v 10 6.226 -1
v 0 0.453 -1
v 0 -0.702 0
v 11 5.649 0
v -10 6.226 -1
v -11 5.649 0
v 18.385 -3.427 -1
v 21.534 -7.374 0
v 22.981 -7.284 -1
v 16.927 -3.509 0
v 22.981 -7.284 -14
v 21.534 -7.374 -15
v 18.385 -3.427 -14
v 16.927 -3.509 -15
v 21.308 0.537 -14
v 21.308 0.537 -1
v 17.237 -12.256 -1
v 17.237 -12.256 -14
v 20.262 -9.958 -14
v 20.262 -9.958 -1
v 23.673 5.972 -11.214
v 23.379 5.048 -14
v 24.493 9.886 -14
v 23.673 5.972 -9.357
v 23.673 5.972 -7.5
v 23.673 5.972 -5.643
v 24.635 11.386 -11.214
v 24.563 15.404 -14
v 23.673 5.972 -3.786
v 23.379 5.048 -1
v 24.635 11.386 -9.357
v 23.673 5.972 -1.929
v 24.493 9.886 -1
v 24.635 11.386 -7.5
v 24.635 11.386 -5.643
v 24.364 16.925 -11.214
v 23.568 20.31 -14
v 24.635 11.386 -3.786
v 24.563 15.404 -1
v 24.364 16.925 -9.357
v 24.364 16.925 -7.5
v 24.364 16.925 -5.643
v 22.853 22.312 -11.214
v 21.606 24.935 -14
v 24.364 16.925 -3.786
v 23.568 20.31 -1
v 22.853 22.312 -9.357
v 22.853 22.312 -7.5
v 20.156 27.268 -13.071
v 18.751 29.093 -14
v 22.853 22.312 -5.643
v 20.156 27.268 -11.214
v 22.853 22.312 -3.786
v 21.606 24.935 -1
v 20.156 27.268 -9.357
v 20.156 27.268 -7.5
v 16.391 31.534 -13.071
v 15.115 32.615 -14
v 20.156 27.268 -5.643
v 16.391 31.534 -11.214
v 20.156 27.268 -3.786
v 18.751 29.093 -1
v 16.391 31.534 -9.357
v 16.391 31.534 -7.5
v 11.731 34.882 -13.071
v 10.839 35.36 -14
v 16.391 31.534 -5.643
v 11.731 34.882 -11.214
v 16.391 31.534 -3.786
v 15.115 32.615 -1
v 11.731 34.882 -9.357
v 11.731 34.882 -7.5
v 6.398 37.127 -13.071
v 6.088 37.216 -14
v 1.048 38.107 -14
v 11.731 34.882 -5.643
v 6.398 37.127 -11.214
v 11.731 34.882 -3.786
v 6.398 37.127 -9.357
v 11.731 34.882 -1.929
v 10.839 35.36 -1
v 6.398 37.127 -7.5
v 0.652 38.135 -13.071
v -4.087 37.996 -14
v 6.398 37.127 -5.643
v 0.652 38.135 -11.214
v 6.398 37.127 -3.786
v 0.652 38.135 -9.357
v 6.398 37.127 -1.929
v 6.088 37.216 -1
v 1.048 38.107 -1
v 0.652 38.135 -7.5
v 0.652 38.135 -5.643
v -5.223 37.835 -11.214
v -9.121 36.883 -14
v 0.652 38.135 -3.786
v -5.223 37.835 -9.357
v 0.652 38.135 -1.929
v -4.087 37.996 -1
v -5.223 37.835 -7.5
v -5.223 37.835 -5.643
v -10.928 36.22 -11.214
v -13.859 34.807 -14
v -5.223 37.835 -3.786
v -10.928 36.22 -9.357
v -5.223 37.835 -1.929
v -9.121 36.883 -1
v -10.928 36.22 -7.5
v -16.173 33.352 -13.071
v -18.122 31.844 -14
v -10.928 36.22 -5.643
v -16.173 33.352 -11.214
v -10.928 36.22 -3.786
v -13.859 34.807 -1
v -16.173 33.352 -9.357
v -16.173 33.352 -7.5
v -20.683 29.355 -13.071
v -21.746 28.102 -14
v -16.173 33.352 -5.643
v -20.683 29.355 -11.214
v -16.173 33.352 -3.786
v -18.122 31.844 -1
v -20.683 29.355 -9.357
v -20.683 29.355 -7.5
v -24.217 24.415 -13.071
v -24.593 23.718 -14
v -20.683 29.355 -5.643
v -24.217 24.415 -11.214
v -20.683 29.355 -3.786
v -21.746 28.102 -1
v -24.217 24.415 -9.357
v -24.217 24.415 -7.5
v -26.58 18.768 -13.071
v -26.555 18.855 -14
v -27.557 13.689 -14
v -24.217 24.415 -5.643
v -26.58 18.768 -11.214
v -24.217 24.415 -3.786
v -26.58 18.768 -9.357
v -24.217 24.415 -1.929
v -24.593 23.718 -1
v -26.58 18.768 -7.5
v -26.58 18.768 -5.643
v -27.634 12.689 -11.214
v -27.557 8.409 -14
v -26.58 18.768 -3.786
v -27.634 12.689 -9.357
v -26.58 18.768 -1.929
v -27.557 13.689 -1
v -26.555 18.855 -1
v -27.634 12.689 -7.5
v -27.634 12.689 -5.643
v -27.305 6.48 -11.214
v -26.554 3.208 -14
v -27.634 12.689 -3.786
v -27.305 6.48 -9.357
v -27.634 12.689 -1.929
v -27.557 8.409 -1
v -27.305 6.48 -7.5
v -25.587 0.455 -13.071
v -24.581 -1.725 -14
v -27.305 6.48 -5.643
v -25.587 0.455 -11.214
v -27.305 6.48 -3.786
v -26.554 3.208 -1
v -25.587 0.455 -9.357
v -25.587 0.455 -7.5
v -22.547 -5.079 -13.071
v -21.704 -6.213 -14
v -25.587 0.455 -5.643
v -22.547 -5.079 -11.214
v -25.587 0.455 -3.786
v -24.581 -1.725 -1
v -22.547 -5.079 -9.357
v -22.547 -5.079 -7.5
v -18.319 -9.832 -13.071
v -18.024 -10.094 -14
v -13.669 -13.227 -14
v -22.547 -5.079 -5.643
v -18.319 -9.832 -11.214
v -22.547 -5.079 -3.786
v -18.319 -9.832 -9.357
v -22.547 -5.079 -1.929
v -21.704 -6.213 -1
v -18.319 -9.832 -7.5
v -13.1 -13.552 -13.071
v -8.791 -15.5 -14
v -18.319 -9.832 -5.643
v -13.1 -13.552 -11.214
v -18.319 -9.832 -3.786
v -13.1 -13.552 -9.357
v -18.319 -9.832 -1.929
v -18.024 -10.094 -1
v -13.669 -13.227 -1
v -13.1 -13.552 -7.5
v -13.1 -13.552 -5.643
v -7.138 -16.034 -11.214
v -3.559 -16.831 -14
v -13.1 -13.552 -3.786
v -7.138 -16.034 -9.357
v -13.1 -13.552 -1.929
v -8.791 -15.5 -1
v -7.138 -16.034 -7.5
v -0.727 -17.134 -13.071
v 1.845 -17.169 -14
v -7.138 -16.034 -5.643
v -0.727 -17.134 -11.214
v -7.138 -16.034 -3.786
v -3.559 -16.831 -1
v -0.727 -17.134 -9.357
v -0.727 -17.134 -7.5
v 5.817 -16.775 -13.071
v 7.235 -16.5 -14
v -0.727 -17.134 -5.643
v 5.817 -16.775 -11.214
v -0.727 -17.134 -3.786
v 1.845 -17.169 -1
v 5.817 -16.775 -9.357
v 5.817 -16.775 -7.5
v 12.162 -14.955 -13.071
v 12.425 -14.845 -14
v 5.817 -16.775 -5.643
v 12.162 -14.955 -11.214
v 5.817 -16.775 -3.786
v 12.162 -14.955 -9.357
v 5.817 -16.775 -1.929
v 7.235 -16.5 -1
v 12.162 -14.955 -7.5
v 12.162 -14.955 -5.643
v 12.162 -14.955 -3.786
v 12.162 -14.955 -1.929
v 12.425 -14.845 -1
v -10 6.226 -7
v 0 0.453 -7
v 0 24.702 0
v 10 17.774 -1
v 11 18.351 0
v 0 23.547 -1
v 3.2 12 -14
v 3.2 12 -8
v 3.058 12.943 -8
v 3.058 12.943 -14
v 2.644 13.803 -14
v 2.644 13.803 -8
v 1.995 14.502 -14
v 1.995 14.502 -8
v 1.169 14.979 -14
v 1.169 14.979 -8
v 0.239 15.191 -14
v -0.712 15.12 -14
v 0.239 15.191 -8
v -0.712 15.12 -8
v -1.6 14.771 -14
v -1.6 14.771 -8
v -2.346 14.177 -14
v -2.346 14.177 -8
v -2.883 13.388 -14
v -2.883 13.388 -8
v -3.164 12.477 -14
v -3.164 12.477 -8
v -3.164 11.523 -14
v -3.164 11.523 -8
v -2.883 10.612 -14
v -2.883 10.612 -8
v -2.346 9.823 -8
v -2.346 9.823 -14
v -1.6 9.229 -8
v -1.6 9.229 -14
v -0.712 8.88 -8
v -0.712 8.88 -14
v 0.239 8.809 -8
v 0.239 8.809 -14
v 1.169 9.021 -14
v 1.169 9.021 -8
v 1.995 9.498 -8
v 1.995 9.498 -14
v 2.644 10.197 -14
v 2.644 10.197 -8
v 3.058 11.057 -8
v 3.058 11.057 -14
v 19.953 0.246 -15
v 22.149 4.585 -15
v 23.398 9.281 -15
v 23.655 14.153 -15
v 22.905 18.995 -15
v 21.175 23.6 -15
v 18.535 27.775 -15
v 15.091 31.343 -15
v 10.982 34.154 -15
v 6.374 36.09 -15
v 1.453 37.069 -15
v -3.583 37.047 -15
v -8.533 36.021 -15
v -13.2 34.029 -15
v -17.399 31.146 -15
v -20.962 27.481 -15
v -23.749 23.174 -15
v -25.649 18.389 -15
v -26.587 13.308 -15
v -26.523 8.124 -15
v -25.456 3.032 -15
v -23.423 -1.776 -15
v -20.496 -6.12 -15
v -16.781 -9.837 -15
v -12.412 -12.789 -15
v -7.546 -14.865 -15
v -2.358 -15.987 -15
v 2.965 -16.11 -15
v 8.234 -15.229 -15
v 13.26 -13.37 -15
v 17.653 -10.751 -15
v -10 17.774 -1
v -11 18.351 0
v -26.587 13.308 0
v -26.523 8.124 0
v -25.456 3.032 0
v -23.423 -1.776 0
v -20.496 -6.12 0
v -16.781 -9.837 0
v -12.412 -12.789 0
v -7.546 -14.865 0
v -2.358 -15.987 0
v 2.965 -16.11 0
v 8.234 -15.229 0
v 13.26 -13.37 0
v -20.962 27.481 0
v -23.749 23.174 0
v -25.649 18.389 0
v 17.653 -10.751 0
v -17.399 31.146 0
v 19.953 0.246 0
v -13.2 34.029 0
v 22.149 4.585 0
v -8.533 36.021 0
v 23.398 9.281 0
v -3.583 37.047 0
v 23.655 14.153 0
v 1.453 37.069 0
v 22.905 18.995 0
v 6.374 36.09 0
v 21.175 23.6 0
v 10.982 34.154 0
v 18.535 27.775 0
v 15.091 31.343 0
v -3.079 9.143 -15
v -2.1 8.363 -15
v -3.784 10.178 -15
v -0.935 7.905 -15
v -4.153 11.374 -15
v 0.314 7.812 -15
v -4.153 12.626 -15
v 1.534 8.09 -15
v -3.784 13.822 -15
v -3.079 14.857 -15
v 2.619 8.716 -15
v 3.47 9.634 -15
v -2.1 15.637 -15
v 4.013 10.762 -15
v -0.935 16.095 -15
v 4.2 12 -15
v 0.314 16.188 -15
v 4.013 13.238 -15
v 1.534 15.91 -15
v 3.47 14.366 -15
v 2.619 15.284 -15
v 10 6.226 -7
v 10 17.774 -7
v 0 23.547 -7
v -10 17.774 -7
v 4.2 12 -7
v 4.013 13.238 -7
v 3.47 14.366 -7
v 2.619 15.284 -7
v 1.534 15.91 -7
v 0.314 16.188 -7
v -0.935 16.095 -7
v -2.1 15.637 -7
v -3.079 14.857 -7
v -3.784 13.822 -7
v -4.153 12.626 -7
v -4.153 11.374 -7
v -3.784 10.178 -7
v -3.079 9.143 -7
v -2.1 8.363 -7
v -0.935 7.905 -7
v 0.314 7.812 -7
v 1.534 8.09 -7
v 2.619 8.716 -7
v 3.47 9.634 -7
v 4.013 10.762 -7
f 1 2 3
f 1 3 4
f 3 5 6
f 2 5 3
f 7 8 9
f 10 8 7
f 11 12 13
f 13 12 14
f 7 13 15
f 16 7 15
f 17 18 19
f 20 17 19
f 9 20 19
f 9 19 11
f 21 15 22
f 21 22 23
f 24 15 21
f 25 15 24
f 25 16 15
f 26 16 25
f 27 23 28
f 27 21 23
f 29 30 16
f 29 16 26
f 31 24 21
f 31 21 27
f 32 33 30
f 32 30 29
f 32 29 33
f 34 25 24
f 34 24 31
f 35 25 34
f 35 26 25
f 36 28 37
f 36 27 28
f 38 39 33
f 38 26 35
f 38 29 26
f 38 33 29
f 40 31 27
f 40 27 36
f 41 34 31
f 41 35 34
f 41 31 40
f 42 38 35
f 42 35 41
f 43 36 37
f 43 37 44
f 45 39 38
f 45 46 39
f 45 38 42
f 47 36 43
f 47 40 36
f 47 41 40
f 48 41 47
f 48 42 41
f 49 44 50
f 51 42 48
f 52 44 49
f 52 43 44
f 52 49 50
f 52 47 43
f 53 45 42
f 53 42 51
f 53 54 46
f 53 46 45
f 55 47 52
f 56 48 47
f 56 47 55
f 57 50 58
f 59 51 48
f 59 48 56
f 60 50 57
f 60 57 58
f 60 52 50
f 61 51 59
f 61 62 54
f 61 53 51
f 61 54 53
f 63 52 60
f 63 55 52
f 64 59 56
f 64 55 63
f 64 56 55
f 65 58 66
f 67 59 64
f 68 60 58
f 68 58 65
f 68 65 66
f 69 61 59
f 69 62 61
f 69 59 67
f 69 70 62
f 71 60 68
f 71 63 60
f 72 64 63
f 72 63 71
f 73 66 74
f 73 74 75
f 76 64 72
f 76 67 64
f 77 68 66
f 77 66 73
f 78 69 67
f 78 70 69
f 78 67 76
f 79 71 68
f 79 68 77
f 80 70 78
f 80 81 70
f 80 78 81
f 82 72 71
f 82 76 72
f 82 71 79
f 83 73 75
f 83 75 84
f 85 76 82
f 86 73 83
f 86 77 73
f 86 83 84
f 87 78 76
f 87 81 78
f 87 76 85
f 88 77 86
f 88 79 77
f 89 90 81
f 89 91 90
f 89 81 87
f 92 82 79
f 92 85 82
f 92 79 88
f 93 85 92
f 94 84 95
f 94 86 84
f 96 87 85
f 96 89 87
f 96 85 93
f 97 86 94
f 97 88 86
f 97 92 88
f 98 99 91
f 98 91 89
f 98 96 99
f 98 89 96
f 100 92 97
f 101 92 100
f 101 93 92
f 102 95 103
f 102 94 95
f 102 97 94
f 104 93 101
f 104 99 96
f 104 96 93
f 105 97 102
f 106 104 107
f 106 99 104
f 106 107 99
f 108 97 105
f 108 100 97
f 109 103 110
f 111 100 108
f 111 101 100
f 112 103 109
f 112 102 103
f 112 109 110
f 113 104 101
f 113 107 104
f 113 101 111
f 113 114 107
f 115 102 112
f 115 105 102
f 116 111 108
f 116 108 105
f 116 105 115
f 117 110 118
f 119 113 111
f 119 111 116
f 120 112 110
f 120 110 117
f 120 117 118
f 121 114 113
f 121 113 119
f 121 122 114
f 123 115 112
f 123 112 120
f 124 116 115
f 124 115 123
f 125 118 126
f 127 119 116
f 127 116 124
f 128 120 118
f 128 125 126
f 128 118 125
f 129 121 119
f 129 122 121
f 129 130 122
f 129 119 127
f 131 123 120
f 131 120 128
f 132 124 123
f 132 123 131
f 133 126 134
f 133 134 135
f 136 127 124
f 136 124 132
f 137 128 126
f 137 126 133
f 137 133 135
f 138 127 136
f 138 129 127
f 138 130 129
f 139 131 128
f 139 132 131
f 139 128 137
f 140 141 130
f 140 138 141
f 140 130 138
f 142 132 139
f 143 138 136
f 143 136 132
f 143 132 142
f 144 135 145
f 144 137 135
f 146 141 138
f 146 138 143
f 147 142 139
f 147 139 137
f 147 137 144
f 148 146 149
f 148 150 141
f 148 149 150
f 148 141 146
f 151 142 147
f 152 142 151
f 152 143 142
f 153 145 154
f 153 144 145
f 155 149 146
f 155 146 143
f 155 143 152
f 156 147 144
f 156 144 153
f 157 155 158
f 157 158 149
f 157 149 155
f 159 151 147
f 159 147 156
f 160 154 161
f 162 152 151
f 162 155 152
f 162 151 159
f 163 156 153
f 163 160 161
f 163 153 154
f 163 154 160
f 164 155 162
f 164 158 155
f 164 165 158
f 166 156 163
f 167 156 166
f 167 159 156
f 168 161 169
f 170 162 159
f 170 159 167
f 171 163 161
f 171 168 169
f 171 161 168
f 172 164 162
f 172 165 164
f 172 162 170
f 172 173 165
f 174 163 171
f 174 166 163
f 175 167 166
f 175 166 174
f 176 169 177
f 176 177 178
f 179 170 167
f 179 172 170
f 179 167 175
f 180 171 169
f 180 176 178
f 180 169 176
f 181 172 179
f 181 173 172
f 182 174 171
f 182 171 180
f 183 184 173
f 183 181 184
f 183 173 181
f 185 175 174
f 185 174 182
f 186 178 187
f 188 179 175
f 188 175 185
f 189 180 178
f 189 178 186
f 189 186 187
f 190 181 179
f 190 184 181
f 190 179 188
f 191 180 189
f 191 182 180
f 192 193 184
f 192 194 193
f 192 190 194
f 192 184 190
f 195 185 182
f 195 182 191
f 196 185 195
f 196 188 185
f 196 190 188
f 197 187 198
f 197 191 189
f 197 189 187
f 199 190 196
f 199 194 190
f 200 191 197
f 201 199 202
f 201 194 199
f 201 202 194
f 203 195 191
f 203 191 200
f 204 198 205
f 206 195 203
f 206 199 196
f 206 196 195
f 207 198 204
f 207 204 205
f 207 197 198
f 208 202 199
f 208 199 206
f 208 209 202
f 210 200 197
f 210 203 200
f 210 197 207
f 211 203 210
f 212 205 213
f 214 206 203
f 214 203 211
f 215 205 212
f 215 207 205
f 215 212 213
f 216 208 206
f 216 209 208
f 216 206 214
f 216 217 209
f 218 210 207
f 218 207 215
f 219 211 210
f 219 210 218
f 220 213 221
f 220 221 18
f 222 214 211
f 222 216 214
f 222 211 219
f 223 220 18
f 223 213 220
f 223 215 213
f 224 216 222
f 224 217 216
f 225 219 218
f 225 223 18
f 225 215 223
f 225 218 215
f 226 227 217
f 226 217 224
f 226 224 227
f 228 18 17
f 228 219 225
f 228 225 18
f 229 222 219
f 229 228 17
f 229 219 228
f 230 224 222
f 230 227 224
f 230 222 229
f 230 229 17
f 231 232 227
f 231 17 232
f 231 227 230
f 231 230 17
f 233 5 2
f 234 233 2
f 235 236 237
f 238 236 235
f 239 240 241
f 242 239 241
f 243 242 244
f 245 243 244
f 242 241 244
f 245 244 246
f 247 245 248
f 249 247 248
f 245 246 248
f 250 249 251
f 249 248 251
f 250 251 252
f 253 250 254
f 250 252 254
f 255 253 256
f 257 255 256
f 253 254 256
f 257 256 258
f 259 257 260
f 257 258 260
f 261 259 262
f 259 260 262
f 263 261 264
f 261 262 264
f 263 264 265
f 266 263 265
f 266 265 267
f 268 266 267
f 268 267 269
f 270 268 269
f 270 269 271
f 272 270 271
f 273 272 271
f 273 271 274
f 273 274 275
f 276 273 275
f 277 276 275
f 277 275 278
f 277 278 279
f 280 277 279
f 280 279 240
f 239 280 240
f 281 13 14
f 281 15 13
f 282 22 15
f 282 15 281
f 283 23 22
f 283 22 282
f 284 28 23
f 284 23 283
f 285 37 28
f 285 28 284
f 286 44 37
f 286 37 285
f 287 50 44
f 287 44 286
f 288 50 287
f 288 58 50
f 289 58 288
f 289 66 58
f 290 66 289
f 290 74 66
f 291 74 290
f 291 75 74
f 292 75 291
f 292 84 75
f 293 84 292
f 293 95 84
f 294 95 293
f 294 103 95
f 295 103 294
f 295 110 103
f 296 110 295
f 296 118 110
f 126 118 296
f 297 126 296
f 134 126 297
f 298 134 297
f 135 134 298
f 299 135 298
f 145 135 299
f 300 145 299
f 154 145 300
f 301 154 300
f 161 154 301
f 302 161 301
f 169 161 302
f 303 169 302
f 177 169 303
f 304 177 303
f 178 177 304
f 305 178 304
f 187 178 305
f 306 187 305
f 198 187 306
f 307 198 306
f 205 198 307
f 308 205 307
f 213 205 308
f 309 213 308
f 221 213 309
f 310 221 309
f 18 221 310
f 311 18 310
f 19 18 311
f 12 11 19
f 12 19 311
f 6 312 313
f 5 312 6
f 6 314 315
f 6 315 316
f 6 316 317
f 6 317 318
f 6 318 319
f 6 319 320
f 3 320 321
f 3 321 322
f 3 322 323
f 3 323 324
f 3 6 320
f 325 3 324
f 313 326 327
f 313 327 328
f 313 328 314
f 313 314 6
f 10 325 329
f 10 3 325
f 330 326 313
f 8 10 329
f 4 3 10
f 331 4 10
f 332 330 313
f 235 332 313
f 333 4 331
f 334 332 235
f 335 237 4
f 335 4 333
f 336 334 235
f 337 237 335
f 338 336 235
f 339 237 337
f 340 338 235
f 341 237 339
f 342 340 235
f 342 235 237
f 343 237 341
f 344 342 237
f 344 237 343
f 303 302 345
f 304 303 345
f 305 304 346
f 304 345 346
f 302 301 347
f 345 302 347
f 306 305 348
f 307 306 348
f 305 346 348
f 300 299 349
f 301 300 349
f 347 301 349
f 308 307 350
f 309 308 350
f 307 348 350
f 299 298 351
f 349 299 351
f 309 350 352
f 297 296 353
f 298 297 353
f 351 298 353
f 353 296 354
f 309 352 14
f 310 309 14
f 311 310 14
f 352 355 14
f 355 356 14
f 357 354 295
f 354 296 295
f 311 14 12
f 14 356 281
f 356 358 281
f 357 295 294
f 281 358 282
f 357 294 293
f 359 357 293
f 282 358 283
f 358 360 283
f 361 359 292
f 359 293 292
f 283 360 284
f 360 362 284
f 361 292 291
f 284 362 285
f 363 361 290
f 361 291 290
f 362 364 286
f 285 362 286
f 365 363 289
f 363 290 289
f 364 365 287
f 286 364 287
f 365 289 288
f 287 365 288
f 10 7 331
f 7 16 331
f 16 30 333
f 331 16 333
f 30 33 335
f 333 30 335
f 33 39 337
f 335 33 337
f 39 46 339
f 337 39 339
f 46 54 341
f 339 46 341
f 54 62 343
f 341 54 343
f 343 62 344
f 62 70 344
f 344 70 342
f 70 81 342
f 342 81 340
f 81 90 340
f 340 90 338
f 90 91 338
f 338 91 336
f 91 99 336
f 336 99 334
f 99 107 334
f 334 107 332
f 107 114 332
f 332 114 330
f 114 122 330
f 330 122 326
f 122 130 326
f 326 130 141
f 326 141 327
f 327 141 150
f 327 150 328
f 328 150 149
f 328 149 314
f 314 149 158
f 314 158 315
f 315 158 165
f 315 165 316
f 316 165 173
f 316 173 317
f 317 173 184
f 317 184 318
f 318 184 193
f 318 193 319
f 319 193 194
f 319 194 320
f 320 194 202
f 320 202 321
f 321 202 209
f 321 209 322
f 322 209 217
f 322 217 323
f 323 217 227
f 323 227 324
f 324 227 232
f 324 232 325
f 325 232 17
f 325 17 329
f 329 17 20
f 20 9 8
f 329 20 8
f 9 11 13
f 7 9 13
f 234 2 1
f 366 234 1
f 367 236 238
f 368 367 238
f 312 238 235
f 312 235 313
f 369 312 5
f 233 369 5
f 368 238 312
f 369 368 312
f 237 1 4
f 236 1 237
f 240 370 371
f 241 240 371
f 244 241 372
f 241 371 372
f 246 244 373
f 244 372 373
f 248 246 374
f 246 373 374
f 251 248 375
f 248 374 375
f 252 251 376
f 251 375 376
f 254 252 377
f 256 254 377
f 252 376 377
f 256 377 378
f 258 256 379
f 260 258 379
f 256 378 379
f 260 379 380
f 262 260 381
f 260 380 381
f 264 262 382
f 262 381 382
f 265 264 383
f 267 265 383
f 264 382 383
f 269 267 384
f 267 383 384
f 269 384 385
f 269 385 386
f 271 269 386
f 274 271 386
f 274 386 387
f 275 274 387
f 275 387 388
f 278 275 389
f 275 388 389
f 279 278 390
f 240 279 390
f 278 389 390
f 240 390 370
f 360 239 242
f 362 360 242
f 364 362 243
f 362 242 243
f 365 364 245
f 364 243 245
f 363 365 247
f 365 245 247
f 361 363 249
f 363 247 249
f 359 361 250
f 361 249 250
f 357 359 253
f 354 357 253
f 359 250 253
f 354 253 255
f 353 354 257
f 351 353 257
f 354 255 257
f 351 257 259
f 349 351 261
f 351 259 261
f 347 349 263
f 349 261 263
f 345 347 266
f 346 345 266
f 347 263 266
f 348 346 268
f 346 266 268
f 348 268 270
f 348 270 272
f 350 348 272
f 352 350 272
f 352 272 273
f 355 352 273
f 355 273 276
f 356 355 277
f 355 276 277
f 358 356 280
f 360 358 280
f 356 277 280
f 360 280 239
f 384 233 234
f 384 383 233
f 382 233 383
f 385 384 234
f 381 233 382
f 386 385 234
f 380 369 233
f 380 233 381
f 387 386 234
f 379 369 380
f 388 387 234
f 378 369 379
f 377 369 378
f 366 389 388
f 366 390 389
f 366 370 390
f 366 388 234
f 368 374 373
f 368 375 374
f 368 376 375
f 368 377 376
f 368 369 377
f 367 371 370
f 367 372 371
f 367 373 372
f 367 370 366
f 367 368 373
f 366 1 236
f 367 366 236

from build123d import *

# Parameters (mm, degrees)
PAD011_DEPTH    = 15
POCKET009_DEPTH = 7
SKETCH024_R     = 3.2
POCKET010_DEPTH = 8.001
CHAMFER002_SIZE = 1


with BuildPart() as part:
    # Sketch022 → Pad011 (new body)
    with BuildSketch(Plane(origin=(0, 12, 0), x_dir=(1, 0, 0), z_dir=(0, 0, 1))):
        with BuildLine():
            add(Edge.make_bspline(
                [(18.385067, -15.426903), (25.636949, -7.451184), (29.167143, 4.188206), (26.974214, 17.612295), (18.090552, 29.751556), (3.35831, 36.969816), (-14.204536, 36.253542), (-29.939339, 26.647227), (-39.094212, 10.198881), (-39.001928, -8.479394), (-30.172825, -24.273207), (-15.683623, -33.497423), (0.297085, -34.860416), (13.998556, -29.322146), (22.981333, -19.283628)],
                knots=[0, 0, 0, 0, 0, 0, 0, 0, 0, 0, 0, 0, 0, 0, 0, 6.362265, 6.362265, 6.362265, 6.362265, 6.362265, 6.362265, 6.362265, 6.362265, 6.362265, 6.362265, 6.362265, 6.362265, 6.362265, 6.362265, 6.362265], degree=14))
            Line((22.981333, -19.283628), (18.385067, -15.426903))
        make_face()
    extrude(amount=-PAD011_DEPTH)

    # Sketch023 (on Face3 of Pad011) → Pocket009 (cut)
    with BuildSketch(Plane(origin=(0, 12, 0), x_dir=(1, 0, 0), z_dir=(0, 0, 1))):
        Polygon((0, -11.547005), (10, -5.773503), (10, 5.773503), (0, 11.547005), (-10, 5.773503), (-10, -5.773503), align=None)
    extrude(amount=-POCKET009_DEPTH, mode=Mode.SUBTRACT)

    # Sketch024 (on Face11 of Pocket009) → Pocket010 (cut, through all)
    with BuildSketch(Plane(origin=(0, 12, -7), x_dir=(1, 0, 0), z_dir=(0, 0, 1))):
        Circle(SKETCH024_R)
    extrude(amount=-POCKET010_DEPTH, mode=Mode.SUBTRACT)

    # Chamfer002
    chamfer002_edges = [part.edges().sort_by_distance(p)[0] for p in [
        (-23.516179, 25.600665, 0),
        (20.6832, -5.355266, 0),
        (5, 3.339746, 0),
        (10, 12, 0),
        (5, 20.660254, 0),
        (-5, 20.660254, 0),
        (-10, 12, 0),
        (-5, 3.339746, 0),
        (-3.2, 12, -7),
        (-23.516179, 25.600665, -15),
        (20.6832, -5.355266, -15),
        (-3.2, 12, -15),
    ]]
    chamfer(chamfer002_edges, length=CHAMFER002_SIZE)


solid = part.part
